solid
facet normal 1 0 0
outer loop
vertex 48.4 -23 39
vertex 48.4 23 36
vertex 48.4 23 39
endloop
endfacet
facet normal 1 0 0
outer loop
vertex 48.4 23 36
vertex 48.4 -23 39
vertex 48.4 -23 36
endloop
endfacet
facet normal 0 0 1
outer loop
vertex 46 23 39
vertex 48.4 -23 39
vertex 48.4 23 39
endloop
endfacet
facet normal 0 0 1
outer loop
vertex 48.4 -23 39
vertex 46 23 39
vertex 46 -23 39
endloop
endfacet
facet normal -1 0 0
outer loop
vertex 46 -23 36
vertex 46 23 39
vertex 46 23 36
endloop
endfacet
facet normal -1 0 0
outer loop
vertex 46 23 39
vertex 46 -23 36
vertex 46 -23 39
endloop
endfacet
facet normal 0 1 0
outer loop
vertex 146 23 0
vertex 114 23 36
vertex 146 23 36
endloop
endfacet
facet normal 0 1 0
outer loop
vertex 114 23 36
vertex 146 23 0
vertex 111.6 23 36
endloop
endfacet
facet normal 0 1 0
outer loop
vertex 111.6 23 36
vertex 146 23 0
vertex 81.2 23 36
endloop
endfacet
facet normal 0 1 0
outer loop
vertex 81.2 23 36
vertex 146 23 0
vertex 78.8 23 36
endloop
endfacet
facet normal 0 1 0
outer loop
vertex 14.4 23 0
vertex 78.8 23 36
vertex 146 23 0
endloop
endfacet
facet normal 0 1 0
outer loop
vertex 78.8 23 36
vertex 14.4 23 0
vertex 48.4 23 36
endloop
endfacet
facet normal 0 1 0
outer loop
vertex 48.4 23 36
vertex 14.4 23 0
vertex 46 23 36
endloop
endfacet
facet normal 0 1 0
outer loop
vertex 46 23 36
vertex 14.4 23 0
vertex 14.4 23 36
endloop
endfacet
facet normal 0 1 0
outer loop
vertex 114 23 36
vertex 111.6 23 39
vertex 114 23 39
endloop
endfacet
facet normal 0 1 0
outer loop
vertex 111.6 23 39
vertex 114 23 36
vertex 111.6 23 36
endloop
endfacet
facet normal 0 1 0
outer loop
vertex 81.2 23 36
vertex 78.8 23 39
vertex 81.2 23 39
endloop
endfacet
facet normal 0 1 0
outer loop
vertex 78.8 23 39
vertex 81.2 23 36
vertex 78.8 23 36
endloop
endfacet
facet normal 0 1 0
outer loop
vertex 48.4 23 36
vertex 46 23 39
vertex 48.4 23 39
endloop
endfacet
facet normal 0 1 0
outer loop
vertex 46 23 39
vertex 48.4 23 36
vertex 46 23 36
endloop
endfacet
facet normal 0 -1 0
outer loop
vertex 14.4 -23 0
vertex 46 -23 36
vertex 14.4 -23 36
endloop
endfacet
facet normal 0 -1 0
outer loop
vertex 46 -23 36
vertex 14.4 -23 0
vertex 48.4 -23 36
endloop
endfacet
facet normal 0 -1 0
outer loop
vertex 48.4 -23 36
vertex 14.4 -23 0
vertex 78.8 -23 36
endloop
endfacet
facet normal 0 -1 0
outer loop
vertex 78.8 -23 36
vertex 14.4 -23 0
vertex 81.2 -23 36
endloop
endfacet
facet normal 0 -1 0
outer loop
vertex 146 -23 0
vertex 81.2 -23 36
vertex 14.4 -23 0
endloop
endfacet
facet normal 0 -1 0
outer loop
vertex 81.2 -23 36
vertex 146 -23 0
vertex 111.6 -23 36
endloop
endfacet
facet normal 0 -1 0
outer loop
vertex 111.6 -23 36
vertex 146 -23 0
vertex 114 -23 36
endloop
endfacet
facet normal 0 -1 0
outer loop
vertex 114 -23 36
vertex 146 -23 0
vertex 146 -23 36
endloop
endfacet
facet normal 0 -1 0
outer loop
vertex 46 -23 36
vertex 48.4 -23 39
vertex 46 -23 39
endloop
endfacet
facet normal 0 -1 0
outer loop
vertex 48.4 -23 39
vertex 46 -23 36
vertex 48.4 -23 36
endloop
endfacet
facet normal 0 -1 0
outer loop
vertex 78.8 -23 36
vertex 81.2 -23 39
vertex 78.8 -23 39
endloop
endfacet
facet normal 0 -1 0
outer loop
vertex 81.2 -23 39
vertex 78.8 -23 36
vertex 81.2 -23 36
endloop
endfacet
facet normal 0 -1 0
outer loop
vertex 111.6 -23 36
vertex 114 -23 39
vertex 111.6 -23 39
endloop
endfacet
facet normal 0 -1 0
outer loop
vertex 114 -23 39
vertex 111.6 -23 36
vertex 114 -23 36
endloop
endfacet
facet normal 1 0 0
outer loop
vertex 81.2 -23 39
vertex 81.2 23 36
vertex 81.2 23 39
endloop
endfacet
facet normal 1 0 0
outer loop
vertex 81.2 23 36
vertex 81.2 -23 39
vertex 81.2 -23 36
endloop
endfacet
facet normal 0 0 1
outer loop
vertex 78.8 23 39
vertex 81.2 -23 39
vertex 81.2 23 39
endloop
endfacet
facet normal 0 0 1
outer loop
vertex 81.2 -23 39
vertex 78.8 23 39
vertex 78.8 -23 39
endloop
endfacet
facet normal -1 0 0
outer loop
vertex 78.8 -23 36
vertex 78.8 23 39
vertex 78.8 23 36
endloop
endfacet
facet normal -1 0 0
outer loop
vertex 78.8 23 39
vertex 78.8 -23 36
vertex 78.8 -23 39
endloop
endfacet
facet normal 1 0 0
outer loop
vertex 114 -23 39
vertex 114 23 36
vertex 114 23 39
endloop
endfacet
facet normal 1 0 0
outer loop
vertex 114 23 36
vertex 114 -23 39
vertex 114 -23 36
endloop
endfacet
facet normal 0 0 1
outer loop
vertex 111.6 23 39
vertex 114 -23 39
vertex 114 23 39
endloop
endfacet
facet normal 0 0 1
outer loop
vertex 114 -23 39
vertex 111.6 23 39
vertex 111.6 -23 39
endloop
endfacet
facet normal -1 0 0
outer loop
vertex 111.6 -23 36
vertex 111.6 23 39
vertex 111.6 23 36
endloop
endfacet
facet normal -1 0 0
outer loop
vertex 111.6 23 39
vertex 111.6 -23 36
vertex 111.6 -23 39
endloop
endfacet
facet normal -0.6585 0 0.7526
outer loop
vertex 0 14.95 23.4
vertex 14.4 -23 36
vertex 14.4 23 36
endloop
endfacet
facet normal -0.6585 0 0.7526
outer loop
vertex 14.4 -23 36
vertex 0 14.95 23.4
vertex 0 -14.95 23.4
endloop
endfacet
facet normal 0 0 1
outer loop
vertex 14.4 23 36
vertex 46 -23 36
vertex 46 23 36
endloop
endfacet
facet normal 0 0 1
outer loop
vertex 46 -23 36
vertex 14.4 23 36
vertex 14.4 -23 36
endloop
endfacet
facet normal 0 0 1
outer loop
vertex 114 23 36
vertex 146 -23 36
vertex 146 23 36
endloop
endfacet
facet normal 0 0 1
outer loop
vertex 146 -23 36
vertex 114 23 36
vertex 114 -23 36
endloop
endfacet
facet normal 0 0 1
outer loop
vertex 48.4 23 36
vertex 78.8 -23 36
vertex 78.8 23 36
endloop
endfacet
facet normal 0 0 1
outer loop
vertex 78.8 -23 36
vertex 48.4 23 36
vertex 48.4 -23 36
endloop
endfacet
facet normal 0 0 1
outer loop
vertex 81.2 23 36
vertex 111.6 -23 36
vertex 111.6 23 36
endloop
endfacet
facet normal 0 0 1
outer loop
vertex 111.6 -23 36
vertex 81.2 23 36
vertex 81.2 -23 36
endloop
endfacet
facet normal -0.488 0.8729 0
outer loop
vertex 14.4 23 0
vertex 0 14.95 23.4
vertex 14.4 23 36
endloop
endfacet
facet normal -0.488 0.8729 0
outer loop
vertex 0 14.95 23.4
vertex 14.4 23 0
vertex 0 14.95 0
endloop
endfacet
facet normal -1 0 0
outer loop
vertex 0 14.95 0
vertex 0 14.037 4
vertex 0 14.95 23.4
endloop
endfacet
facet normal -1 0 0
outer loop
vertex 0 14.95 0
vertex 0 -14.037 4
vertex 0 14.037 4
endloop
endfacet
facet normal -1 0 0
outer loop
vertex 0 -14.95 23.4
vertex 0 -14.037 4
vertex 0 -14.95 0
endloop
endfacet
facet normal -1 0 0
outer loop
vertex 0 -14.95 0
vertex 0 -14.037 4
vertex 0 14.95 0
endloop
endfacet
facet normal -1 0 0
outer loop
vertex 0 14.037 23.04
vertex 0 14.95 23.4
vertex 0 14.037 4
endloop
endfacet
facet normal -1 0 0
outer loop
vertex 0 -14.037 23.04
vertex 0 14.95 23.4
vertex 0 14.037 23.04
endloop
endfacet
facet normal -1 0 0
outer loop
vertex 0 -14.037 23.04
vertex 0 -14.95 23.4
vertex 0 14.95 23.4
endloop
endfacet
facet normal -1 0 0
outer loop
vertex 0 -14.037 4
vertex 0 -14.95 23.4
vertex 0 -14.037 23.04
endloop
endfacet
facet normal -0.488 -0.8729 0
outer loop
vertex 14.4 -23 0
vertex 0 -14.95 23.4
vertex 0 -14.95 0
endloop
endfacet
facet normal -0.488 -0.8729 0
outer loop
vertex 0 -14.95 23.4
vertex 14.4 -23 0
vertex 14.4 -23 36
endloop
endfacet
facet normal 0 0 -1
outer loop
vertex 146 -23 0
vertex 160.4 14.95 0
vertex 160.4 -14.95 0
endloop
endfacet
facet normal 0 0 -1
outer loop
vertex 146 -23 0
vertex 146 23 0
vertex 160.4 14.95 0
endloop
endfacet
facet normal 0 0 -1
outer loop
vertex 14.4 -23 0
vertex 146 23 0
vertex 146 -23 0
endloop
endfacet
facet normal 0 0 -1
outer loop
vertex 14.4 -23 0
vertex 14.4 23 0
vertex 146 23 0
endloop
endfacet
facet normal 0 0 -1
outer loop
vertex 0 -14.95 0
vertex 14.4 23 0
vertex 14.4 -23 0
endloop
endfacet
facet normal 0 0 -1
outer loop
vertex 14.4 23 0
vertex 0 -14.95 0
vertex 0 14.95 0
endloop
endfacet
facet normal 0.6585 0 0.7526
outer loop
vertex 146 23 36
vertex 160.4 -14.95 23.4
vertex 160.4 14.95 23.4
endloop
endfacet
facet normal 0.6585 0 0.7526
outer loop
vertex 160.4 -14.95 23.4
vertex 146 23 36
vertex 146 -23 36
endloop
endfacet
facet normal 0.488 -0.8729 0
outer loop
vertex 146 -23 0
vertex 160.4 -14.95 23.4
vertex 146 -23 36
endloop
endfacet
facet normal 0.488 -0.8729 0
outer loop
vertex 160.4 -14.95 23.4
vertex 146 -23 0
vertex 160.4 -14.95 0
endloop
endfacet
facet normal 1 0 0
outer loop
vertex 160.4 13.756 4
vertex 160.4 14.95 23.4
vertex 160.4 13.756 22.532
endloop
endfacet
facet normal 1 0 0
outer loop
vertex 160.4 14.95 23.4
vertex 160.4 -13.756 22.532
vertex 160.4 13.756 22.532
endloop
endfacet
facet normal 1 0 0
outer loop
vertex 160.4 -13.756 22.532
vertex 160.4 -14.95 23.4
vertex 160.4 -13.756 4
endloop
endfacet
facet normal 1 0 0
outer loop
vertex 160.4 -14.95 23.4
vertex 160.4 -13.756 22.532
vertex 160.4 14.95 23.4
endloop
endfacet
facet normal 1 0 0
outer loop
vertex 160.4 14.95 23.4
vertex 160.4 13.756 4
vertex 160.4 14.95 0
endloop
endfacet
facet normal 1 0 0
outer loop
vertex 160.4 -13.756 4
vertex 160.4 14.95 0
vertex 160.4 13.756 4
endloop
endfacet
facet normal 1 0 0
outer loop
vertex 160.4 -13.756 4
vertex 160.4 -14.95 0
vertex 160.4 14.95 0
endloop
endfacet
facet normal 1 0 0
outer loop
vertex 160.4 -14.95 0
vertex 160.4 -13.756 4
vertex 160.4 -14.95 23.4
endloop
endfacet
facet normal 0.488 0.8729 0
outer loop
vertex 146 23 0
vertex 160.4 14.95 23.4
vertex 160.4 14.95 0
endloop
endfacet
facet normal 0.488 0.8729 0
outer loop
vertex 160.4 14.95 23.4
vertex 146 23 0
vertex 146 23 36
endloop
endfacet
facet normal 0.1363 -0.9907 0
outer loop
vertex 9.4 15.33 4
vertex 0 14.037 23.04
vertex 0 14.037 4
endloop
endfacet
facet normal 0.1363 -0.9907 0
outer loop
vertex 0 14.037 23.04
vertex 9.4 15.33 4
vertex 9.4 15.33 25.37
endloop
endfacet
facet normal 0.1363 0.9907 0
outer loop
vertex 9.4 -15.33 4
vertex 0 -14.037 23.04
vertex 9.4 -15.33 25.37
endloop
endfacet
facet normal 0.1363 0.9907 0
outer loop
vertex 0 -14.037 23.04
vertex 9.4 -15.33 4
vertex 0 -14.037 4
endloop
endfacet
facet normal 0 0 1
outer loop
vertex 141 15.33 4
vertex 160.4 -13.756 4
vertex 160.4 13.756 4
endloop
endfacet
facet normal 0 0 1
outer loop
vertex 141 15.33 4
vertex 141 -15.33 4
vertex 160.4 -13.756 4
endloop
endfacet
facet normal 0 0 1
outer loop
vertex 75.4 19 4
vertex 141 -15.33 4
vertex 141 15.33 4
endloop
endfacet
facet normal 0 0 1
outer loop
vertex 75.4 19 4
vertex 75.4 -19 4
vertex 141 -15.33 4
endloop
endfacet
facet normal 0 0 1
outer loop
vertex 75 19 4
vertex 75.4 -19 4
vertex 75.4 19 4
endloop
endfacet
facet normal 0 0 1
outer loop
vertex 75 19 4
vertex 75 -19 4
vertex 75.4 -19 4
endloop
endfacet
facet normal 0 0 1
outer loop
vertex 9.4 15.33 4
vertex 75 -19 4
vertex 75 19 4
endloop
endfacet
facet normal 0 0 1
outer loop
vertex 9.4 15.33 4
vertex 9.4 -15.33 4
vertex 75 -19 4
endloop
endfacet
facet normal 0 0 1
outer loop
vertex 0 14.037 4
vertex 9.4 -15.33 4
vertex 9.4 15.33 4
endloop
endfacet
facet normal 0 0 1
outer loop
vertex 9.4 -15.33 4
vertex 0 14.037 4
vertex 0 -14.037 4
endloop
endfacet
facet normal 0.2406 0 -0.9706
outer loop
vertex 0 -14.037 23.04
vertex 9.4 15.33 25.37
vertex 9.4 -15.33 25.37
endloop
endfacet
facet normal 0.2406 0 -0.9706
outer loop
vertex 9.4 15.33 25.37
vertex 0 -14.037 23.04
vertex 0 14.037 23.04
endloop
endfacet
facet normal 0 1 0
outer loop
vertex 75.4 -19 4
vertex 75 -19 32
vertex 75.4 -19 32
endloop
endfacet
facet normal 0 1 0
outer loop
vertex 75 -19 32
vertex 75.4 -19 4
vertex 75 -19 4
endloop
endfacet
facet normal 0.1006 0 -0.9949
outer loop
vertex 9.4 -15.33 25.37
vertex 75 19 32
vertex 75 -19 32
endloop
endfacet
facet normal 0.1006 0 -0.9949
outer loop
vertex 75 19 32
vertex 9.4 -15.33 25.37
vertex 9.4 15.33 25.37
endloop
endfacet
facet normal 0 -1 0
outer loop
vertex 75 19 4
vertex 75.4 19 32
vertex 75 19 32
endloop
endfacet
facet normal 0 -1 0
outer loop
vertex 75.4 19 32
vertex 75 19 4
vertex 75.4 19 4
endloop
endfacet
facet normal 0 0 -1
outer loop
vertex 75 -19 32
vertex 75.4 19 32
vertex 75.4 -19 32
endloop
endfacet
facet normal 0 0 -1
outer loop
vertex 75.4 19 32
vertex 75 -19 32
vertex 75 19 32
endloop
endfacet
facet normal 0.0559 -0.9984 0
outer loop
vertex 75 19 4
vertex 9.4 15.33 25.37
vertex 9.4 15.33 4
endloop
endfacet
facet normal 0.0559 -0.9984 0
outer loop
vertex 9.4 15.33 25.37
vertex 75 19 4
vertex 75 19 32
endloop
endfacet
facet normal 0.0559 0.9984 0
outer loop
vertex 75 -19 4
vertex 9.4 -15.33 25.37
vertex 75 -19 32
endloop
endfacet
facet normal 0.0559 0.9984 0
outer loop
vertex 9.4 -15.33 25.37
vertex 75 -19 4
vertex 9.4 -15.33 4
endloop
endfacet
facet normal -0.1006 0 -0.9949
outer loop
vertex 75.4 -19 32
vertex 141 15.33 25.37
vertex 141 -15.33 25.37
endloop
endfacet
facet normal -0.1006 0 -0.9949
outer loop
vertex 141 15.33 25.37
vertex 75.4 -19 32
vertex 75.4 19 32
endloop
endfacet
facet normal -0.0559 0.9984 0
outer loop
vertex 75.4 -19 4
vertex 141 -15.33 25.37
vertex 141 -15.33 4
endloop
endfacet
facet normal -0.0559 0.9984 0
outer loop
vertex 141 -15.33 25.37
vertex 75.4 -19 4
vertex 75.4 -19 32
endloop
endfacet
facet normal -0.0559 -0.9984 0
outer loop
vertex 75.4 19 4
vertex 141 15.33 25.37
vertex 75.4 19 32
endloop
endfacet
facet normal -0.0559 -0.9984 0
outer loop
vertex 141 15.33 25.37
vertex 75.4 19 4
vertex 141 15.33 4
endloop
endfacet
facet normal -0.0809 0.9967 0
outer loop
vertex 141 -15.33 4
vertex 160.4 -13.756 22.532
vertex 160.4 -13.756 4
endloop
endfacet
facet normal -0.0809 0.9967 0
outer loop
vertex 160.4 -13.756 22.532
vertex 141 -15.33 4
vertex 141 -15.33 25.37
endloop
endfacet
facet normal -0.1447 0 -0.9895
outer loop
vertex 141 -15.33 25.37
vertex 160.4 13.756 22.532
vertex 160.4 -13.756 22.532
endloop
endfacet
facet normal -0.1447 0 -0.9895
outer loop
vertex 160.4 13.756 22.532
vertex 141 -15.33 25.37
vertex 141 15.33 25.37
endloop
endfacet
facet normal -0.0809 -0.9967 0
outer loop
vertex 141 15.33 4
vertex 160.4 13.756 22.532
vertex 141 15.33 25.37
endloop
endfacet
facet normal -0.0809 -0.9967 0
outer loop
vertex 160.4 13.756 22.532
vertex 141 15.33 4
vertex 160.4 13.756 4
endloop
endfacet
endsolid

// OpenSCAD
$fn = 32;

// ----------------------------------------------------------------------
// Faired channel: 160 x 46 x 36 mm, 4 mm walls, faired ends
// ----------------------------------------------------------------------

// --- parameters (mm) ---
length = 160;             // channel length
width = 46;               // channel width at mid length
height = 36;              // channel height at mid length
wall = 4;                 // side wall thickness
floor_t = 4;              // floor thickness
end_w = 29.9;             // faired end width
end_h = 23.4;             // faired end height
ribs = 3;                 // stiffening ribs on the top
rib_t = 2.4;              // rib thickness
rib_h = 3;                // rib height

difference() {
  union() {
    hull() {
      translate([0, -14.95, 0]) cube([0.4, 29.9, 23.4]);
      translate([14.4, -23, 0]) cube([0.4, 46, 36]);
    }
    hull() {
      translate([14.4, -23, 0]) cube([0.4, 46, 36]);
      translate([80, -23, 0]) cube([0.4, 46, 36]);
    }
    hull() {
      translate([80, -23, 0]) cube([0.4, 46, 36]);
      translate([145.6, -23, 0]) cube([0.4, 46, 36]);
    }
    hull() {
      translate([145.6, -23, 0]) cube([0.4, 46, 36]);
      translate([160, -14.95, 0]) cube([0.4, 29.9, 23.4]);
    }
    /* stiffening ribs across the flat top, sunk 0.8 mm into it */
    for (i = [1 : ribs]) {
      translate([14.4 + i * (length - 2 * 14.4) / (ribs + 1) - rib_t / 2, -width / 2, height - 0.8]) cube([rib_t, width, rib_h + 0.8]);
    }
  }
  /* cavity, 5 mm proud of both ends so the ports are cut clean */
  hull() {
    translate([-5, -13.35, 4]) cube([0.4, 26.7, 17.8]);
    translate([9.4, -15.33, 4]) cube([0.4, 30.66, 21.37]);
  }
  hull() {
    translate([9.4, -15.33, 4]) cube([0.4, 30.66, 21.37]);
    translate([75, -19, 4]) cube([0.4, 38, 28]);
  }
  hull() {
    translate([75, -19, 4]) cube([0.4, 38, 28]);
    translate([140.6, -15.33, 4]) cube([0.4, 30.66, 21.37]);
  }
  hull() {
    translate([140.6, -15.33, 4]) cube([0.4, 30.66, 21.37]);
    translate([165, -13.35, 4]) cube([0.4, 26.7, 17.8]);
  }
}
